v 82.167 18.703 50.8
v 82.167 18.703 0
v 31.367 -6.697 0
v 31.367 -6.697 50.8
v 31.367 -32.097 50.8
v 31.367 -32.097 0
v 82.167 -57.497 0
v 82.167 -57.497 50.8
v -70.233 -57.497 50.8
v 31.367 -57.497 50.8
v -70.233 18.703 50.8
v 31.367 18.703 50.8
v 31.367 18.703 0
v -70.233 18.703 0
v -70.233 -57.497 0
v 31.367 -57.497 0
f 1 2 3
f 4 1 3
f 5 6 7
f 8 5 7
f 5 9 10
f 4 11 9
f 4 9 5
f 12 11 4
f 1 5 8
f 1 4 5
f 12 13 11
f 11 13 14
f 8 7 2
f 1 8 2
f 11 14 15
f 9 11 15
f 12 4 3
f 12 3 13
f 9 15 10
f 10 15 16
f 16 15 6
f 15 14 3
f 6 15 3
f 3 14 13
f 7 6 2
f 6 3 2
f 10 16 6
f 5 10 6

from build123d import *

# Parameters (mm, degrees)
F1_DEPTH = 25.4
F2_DEPTH = 50.8


with BuildPart() as f1:
    # F0 (on Top) → F1 (new body)
    with BuildSketch(Plane.XY):
        Polygon((82.166834, 18.702962), (31.366834, -6.697038), (31.366834, -32.097038), (82.166834, -57.497038), align=None)
    extrude(amount=F1_DEPTH)

    # F0 (on Top) → F2 (join)
    with BuildSketch(Plane.XY):
        Polygon((31.366834, 18.702962), (-70.233166, 18.702962), (-70.233166, -57.497038), (31.366834, -57.497038), (31.366834, -32.097038), (31.366834, -6.697038), align=None)
        Polygon((82.166834, 18.702962), (31.366834, -6.697038), (31.366834, -32.097038), (82.166834, -57.497038), align=None)
    extrude(amount=F2_DEPTH)


solid = f1.part
